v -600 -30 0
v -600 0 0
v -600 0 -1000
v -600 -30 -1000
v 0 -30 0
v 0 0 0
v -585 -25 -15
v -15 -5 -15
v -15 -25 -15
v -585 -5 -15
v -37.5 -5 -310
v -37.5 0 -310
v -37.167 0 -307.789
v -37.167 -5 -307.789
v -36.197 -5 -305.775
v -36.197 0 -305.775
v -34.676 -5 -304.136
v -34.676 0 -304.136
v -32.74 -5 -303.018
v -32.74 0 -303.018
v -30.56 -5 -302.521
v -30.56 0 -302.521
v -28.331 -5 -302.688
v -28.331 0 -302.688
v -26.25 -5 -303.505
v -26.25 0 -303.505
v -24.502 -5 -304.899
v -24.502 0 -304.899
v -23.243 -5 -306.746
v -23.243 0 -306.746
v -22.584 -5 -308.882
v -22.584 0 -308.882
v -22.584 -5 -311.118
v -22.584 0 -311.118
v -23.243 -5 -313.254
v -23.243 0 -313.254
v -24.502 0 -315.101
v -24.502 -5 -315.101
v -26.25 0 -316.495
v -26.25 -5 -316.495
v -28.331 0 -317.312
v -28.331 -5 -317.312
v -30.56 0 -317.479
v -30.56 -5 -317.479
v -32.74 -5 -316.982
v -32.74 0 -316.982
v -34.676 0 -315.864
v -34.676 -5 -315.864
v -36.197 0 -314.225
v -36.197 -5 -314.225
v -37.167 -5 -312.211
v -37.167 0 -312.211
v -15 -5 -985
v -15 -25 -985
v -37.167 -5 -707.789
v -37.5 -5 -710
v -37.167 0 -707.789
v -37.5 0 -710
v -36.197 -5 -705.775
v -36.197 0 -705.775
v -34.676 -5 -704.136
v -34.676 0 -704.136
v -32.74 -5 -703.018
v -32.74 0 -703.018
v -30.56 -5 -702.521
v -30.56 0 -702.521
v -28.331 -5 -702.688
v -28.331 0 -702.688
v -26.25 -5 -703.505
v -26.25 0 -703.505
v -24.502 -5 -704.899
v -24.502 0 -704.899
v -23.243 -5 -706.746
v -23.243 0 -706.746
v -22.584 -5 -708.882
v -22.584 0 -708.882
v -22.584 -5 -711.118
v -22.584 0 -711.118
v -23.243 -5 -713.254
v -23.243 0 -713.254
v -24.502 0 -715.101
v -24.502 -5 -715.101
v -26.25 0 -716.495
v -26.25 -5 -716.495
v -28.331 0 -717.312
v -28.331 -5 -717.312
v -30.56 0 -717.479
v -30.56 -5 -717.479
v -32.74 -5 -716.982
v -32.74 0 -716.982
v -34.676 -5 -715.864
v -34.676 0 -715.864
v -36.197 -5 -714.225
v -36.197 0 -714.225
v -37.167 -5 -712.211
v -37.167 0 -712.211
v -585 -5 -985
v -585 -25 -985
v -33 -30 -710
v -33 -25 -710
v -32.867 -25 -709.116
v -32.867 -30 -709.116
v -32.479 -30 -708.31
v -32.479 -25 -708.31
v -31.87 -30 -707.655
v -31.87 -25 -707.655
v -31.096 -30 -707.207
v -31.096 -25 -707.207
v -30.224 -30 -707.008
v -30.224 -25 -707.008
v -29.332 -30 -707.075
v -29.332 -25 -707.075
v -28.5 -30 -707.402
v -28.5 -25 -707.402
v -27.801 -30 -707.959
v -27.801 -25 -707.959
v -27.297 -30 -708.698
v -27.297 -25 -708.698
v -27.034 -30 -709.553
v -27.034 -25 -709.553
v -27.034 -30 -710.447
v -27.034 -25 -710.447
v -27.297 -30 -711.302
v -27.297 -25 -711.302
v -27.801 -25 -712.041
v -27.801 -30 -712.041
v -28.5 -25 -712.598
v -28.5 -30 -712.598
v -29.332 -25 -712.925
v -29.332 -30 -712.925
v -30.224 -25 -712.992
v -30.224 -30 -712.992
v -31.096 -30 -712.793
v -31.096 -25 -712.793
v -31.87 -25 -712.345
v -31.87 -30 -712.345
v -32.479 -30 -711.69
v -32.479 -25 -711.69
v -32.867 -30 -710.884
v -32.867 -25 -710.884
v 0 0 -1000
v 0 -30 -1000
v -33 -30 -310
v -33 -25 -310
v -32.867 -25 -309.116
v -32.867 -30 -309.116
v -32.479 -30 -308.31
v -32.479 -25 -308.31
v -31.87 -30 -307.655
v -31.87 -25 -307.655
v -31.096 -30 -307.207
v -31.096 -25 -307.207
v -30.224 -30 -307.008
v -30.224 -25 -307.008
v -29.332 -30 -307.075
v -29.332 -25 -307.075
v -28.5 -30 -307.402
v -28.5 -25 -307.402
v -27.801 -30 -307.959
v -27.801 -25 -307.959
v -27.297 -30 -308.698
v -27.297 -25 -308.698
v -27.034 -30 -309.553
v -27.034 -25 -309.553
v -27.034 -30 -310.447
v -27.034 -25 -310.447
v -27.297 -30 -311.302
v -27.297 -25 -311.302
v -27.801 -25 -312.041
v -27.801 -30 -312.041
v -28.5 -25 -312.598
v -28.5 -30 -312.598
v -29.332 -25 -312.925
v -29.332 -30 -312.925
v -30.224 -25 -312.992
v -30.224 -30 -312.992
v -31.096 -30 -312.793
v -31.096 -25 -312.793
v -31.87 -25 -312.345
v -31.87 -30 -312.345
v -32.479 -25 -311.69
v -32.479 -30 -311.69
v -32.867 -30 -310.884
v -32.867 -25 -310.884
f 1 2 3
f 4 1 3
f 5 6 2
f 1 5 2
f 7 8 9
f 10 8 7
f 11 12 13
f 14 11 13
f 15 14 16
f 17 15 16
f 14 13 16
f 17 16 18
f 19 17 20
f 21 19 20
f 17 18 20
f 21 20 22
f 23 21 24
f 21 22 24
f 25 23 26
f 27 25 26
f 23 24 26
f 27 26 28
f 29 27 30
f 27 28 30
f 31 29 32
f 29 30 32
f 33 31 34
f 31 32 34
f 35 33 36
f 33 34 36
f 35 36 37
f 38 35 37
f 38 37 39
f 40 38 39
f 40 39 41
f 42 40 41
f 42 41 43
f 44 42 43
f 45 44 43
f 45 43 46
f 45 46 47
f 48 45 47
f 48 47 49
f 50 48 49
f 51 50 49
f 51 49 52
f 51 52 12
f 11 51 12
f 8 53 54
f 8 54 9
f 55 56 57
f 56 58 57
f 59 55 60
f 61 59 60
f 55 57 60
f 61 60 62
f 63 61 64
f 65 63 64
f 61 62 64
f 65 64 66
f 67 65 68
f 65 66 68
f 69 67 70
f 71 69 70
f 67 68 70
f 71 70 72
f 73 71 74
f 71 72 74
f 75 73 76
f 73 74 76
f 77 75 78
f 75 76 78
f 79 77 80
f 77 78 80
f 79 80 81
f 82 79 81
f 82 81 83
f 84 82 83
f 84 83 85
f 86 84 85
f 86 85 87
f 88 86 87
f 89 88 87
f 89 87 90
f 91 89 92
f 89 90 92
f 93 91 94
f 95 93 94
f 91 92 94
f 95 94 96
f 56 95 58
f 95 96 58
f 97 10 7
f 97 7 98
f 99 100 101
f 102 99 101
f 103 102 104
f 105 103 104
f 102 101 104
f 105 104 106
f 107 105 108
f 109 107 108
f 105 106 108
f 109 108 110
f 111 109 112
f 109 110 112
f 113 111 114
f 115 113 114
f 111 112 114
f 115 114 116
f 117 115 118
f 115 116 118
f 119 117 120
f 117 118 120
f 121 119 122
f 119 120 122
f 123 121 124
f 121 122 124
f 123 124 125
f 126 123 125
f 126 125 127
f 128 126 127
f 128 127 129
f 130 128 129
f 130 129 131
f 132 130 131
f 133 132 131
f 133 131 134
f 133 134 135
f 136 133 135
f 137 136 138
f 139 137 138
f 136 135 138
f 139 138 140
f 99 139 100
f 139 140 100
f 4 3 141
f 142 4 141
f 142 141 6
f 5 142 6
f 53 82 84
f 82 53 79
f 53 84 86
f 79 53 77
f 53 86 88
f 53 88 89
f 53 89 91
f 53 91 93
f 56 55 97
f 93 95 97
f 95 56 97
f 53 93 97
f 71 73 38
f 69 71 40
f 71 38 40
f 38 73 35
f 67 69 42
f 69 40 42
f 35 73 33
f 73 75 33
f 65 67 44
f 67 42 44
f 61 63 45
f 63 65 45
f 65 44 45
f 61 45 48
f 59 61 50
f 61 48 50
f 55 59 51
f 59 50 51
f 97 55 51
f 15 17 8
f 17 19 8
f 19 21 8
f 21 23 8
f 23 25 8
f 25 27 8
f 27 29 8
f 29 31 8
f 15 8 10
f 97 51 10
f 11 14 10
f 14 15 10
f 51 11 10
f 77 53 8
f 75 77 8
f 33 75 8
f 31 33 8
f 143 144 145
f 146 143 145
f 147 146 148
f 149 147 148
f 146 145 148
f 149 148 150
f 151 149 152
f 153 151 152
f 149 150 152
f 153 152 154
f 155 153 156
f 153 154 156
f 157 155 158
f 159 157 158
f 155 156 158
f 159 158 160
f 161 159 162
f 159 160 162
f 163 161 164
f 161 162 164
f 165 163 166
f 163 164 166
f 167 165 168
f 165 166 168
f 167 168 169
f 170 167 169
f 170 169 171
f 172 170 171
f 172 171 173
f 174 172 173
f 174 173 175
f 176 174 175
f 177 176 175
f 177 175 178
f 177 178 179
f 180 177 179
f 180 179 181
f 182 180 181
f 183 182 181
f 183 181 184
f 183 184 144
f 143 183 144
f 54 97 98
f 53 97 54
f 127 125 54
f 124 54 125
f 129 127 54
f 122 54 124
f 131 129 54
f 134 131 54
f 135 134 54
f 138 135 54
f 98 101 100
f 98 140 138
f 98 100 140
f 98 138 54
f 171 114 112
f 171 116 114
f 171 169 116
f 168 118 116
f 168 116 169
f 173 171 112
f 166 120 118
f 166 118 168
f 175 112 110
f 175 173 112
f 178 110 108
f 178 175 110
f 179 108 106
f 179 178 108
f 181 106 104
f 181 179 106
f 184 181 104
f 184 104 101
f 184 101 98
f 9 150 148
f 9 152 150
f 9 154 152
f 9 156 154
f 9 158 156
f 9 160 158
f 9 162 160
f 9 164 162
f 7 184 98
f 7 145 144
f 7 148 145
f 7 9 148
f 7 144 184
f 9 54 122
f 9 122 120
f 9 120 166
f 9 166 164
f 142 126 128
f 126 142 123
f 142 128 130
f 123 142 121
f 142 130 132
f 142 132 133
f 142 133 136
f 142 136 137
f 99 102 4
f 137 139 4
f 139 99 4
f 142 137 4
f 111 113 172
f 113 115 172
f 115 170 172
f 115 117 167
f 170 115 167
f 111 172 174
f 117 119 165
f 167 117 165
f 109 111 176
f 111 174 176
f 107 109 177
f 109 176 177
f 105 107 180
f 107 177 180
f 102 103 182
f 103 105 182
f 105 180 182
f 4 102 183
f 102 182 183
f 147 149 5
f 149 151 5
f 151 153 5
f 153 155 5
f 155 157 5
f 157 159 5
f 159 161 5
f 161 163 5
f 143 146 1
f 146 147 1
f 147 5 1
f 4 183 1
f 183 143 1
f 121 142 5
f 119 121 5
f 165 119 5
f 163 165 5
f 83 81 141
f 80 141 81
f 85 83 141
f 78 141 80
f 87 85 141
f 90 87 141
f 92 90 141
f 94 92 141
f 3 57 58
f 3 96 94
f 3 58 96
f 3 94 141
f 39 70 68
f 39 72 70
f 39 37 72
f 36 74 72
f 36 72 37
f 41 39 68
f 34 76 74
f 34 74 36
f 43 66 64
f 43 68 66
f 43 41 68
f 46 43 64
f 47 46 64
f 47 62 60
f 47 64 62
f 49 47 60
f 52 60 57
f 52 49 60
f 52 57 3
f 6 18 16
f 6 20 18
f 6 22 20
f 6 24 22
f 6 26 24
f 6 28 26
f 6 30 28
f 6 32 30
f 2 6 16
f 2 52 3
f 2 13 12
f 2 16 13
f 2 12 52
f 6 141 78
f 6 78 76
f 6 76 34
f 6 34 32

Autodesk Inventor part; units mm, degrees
ref_plane "YZ Plane" through (0, 0, 0) normal (1, 0, 0) x (0, 1, 0)
ref_plane "XZ Plane" through (0, 0, 0) normal (0, 1, 0) x (-1, 0, 0)
ref_plane "XY Plane" through (0, 0, 0) normal (0, 0, 1) x (1, 0, 0)
sketch "草圖1" plane through (0, 0, 0) normal (0, 1, 0) x (-1, 0, 0)
  line L0 (0, 0) -> (600, 0)
  line L1 (600, 0) -> (600, -1000)
  line L2 (600, -1000) -> (0, -1000)
  line L3 (0, -1000) -> (0, 0)
  line L4 (0, 0) -> (30, 0)
  line L5 (0, -310) -> (0, 0)
  line L6 (0, -710) -> (0, -310)
  circle A0 centre (30, -310) radius 7.5
  circle A1 centre (30, -710) radius 7.5
  line L7 (0, 0) -> (15, 0)
  line L8 (15, 0) -> (15, -15)
  line L9 (15, -15) -> (0, -15)
  line L10 (0, -15) -> (0, 0)
  line L11 (15, -15) -> (585, -15)
  line L12 (585, -15) -> (585, -985)
  line L13 (585, -985) -> (15, -985)
  line L14 (15, -985) -> (15, -15)
  circle A2 centre (30, -710) radius 3
  circle A3 centre (30, -310) radius 3
  dimension "d0" = 1000
  dimension "d1" = 600
  dimension "d6" = 15
  dimension "d7" = 15
  dimension "d8" = 310
  dimension "d9" = 30
  dimension "d10" = 400
  dimension "d11" = 30
  dimension "d14" = 15
  dimension "d15" = 15
  dimension "d16" = 570
  dimension "d17" = 970
  dimension "d26" = 6
  dimension "d27" = 6
extrude "擠出1" add sketch "草圖1" against normal blind 30 contours L0 L8 L9 L3 | L11 L12 L13 L14 | L0 L1 L2 L3 L9 L8
extrude "擠出2" add sketch "草圖1" against normal blind 30 contours A0 | A1 | A2 | A3
extrude "擠出3" cut sketch "草圖1" against normal blind 25 contours L11 L12 L13 L14
extrude "擠出4" add sketch "草圖1" against normal blind 5 contours L0 L8 L9 L3 | L11 L12 L13 L14 | L0 L1 L2 L3 L9 L8 | A0 | A1 | A2 | A3
extrude "擠出5" cut sketch "草圖1" against normal blind 25 contours A0 | A1 | A2 | A3
extrude "擠出6" cut sketch "草圖1" against normal through all contours A2 | A3
properties part number "Body Actuator"
